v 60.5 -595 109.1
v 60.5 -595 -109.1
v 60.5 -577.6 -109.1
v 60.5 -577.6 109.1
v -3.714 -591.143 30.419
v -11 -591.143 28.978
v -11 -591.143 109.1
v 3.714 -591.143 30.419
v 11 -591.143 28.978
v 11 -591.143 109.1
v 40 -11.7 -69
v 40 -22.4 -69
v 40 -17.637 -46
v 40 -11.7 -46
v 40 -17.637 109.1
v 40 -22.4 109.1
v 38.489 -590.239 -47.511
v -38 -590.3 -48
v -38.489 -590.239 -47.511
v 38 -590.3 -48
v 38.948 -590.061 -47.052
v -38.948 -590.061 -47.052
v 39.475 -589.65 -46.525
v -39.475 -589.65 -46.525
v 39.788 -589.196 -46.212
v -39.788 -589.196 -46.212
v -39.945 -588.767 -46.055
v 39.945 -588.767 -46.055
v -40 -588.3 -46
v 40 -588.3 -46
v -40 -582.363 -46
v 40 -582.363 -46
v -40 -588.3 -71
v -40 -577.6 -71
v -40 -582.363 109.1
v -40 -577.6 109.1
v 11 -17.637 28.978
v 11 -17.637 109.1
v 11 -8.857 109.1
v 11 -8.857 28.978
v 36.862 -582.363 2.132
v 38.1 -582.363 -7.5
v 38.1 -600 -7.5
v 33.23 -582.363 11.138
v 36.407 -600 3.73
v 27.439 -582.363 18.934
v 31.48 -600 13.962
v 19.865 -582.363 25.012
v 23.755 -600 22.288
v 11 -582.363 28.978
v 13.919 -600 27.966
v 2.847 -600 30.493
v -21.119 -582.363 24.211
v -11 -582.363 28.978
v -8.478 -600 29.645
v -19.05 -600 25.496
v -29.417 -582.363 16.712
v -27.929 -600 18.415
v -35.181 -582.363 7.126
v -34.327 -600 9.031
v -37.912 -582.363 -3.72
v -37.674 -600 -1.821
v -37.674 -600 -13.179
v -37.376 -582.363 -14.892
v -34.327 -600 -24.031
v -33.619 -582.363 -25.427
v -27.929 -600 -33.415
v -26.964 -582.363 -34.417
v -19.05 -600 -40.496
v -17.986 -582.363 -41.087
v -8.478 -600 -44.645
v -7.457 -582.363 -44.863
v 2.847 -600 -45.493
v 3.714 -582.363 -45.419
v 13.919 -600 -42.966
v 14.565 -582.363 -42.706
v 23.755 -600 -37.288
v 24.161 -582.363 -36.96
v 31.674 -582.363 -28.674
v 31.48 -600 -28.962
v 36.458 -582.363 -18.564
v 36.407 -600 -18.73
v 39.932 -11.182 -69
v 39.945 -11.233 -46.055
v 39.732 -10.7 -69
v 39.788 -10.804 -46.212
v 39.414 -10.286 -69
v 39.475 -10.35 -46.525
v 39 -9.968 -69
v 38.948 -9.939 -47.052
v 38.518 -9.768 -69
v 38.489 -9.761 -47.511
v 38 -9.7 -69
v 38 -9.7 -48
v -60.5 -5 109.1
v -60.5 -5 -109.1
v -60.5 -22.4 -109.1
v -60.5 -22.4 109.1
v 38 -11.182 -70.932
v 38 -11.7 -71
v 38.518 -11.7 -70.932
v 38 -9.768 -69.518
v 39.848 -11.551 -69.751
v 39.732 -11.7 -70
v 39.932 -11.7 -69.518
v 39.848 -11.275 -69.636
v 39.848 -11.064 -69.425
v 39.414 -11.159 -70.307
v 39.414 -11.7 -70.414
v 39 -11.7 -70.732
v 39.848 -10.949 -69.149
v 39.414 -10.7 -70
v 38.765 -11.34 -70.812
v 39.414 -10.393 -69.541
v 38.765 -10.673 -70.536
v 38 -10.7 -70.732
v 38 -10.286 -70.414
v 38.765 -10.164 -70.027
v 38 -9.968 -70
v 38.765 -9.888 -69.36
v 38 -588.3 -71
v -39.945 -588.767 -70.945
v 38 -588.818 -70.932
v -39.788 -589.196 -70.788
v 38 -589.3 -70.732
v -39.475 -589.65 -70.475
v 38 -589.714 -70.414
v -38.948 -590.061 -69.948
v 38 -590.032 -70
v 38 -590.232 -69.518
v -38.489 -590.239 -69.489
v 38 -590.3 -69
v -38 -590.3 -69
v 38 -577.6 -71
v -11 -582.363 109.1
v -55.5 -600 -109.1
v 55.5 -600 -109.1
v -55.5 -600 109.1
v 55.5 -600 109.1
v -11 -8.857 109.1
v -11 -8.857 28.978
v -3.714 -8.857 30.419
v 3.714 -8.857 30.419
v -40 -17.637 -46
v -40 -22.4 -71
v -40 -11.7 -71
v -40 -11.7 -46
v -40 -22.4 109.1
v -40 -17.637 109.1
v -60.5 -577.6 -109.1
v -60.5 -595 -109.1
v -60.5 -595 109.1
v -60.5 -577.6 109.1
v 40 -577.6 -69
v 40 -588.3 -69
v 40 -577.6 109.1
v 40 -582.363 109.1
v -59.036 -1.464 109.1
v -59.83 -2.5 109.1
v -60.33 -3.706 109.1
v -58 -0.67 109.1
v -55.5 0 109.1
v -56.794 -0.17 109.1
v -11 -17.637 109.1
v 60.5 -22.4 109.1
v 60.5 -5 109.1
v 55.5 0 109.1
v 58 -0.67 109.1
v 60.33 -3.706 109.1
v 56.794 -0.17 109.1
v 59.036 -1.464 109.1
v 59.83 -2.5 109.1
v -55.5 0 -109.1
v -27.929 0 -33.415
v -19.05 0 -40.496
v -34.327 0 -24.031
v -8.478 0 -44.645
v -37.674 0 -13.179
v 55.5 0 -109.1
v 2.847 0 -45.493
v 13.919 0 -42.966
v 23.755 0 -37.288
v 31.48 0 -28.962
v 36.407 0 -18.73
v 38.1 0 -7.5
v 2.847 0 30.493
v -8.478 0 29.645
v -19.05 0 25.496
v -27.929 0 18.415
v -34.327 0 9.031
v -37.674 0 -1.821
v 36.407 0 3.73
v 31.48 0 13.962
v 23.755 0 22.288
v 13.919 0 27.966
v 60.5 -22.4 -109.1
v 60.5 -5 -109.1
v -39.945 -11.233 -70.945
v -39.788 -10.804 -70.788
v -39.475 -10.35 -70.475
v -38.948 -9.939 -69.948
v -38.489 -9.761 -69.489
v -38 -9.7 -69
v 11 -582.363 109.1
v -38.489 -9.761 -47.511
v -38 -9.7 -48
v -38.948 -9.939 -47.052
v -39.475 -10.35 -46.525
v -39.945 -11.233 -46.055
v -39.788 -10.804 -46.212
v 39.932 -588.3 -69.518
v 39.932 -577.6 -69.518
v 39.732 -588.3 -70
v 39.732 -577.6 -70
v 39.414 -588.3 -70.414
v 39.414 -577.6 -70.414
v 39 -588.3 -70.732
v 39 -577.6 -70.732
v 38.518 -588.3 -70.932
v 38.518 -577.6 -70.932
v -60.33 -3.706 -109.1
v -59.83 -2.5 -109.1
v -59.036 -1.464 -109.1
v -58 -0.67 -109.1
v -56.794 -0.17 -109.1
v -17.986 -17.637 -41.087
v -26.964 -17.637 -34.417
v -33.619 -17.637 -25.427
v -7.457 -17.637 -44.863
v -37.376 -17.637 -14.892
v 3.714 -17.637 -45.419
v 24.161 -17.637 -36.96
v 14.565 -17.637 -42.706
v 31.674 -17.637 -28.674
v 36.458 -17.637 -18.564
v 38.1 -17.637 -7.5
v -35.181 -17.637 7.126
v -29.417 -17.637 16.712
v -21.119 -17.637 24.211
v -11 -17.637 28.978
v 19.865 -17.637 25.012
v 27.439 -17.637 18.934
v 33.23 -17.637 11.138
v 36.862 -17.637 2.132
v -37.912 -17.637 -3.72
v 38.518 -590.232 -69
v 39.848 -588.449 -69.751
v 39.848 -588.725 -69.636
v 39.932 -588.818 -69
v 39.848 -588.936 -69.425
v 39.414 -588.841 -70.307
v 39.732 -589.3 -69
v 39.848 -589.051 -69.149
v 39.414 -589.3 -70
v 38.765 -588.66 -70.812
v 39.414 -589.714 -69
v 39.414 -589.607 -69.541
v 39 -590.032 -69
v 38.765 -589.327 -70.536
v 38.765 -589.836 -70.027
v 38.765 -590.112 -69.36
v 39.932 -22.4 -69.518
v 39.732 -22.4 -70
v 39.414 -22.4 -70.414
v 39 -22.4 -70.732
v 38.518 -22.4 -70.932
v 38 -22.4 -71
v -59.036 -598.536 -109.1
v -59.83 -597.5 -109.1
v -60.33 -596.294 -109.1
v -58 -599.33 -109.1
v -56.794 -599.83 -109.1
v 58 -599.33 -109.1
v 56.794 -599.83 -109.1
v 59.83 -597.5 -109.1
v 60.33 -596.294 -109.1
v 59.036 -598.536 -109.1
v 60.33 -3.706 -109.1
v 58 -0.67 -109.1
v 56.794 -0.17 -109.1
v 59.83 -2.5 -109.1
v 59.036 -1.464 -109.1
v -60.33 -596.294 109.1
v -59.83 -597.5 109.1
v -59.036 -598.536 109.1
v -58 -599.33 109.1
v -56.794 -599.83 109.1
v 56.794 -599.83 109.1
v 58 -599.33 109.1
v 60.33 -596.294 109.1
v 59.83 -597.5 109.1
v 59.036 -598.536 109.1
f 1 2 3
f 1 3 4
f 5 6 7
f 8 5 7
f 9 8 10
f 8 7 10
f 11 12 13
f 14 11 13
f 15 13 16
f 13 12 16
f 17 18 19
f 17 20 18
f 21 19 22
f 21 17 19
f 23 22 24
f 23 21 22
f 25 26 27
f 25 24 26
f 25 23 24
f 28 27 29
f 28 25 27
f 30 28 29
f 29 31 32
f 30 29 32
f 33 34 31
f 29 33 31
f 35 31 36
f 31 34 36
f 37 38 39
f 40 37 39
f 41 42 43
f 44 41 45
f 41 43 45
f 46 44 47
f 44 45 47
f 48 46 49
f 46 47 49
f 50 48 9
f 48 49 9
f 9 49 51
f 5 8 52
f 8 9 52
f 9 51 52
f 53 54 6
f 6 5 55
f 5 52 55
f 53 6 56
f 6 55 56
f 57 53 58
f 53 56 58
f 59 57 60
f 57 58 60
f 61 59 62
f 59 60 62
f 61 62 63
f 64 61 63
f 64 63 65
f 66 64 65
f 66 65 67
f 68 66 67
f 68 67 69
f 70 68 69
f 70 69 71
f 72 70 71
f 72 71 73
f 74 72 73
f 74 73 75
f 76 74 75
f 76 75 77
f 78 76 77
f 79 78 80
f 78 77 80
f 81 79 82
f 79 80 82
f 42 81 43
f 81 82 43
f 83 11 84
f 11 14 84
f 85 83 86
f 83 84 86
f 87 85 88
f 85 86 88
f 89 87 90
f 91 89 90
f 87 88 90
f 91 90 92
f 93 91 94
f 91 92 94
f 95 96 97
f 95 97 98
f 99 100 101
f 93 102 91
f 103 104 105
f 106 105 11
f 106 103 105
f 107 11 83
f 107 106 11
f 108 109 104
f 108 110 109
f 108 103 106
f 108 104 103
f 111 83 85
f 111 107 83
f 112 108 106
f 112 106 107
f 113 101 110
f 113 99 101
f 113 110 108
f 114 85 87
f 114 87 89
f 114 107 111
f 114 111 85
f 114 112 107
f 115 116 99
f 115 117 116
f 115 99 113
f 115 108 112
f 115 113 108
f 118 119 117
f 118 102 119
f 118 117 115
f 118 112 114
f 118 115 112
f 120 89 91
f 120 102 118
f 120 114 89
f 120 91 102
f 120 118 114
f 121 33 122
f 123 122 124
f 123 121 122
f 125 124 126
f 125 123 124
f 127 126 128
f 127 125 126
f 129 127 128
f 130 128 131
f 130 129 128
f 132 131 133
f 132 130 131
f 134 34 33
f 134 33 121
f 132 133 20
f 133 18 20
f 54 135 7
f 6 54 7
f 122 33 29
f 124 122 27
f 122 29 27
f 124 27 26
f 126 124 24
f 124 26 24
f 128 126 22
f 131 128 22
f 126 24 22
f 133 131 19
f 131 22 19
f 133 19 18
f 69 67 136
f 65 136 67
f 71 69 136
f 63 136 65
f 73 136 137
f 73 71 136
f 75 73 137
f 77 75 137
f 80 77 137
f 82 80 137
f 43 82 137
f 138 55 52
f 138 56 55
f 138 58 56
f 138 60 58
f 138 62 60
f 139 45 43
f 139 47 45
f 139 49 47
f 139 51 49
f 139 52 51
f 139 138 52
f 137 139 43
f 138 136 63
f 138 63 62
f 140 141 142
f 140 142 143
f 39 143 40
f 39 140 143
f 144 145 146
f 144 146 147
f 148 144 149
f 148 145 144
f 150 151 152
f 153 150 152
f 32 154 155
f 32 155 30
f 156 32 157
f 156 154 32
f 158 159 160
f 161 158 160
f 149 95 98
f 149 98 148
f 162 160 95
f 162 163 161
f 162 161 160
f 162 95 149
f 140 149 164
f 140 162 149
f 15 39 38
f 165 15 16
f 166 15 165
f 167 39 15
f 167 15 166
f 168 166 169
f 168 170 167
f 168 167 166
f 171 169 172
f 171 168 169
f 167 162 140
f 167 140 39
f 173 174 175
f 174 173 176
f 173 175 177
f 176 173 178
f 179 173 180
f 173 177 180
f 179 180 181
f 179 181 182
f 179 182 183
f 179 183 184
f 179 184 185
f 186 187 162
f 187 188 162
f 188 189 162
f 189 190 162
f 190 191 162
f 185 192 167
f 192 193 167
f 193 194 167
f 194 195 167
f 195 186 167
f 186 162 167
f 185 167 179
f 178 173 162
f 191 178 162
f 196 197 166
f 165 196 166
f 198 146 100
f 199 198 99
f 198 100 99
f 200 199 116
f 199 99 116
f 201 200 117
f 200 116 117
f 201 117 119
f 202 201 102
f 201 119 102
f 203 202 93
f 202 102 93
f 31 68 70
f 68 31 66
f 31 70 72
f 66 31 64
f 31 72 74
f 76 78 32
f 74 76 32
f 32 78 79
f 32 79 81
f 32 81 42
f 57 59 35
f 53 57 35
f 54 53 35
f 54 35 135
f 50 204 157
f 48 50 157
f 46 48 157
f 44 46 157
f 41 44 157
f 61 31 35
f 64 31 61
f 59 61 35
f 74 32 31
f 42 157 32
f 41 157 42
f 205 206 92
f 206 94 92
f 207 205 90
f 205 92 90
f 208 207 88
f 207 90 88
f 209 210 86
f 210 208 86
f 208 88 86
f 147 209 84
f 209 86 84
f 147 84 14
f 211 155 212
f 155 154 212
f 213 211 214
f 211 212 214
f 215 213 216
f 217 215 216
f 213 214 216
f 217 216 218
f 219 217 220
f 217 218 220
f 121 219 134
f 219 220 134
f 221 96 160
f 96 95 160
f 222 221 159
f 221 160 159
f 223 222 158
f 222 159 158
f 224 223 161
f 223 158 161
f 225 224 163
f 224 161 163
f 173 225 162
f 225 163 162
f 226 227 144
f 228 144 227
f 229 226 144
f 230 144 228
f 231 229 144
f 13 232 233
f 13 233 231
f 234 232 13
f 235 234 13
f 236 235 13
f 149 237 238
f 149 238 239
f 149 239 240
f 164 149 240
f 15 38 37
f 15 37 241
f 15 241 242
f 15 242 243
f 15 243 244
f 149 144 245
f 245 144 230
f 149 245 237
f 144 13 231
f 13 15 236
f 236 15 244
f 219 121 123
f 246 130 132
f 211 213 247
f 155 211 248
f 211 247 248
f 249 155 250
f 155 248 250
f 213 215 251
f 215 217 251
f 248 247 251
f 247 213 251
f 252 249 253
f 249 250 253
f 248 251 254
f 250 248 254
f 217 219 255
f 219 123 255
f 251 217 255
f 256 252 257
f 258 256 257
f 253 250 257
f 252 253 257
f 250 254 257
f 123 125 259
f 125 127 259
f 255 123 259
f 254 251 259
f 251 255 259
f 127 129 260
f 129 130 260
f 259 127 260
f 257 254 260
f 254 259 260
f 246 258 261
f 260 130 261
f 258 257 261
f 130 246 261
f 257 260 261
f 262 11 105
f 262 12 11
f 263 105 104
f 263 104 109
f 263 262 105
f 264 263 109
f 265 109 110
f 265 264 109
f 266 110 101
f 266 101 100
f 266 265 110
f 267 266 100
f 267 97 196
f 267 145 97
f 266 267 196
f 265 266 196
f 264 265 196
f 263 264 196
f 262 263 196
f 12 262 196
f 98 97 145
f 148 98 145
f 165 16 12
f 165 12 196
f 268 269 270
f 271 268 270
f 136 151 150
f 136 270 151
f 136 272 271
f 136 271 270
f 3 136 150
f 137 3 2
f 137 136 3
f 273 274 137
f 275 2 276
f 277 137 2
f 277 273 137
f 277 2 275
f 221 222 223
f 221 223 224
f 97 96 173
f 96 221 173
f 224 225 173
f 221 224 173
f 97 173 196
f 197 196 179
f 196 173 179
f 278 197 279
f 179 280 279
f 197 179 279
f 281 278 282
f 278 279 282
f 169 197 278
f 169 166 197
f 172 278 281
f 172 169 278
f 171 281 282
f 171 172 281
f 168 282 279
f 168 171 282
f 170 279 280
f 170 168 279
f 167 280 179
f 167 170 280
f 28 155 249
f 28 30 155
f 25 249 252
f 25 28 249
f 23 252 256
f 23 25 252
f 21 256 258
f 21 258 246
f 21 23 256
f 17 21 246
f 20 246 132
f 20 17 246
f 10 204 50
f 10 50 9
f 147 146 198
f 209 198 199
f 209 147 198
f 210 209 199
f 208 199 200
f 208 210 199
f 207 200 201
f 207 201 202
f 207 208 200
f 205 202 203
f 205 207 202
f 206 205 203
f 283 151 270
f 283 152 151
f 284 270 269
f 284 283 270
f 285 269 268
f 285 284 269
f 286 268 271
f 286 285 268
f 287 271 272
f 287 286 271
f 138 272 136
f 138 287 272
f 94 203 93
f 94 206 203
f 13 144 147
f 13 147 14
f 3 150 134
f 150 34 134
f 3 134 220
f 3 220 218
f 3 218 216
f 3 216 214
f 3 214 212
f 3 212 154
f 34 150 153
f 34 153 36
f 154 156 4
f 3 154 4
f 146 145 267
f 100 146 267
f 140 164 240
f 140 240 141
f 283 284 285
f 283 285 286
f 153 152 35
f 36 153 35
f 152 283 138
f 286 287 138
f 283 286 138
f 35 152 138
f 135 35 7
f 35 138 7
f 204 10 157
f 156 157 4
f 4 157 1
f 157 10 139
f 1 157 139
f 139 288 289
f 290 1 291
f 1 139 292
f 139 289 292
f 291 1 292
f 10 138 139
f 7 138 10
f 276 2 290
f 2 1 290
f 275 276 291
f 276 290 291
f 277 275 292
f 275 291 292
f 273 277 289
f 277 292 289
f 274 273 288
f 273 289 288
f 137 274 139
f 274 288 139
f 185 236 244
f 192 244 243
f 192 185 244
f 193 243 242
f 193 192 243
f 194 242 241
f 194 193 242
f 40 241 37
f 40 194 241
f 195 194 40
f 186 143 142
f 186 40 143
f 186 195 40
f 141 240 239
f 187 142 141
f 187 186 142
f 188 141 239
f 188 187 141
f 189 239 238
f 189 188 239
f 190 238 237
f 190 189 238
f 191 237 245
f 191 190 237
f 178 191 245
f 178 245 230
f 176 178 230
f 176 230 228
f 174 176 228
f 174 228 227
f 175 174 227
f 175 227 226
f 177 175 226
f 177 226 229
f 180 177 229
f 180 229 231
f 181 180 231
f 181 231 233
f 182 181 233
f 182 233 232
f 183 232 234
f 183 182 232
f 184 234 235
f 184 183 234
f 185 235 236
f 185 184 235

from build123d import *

# Parameters (mm, degrees)
F0_W      = 121
F0_H      = 218.2
F0_R      = 38.1
F1_DEPTH  = 22.4
F2_W      = 80
F2_H      = 180.1
F3_DEPTH  = 4.763
F4_W      = 80
F4_H      = 25
F5_DEPTH  = 12.7
F6_R      = 5
F7_R      = 2
F10_W     = 22
F10_H     = 8.78
F11_DEPTH = 100


with BuildPart() as f1:
    # F0 (on Front) → F1 (new body)
    with BuildSketch(Plane.XZ):
        Rectangle(F0_W, F0_H)
        with Locations((0, -7.5)):
            Circle(F0_R, mode=Mode.SUBTRACT)
    extrude(amount=F1_DEPTH)

    # F2 (on face) → F3 (cut)
    with BuildSketch(Plane.XZ.offset(22.4)):
        with Locations((0, 19.05)):
            Rectangle(F2_W, F2_H)
    extrude(amount=-F3_DEPTH, mode=Mode.SUBTRACT)

    # F4 (on face) → F5 (cut)
    with BuildSketch(Plane.XZ.offset(22.4)):
        with Locations((0, -58.5)):
            Rectangle(F4_W, F4_H)
    extrude(amount=-F5_DEPTH, mode=Mode.SUBTRACT)

    # F6
    f6_edges = [f1.edges().sort_by_distance(p)[0] for p in [
        (-60.5, 0, 0),
        (60.5, 0, 0),
    ]]
    fillet(f6_edges, radius=F6_R)

    # F7
    f7_edges = [f1.edges().sort_by_distance(p)[0] for p in [
        (0, -9.7, -71),
        (40, -16.05, -71),
        (40, -9.7, -58.5),
        (-40, -9.7, -58.5),
        (0, -9.7, -46),
    ]]
    fillet(f7_edges, radius=F7_R)

    # F10 (on face) → F11 (cut)
    with BuildSketch(Plane.XY.offset(109.1)):
        with Locations((0, -13.247)):
            Rectangle(F10_W, F10_H)
    extrude(amount=-F11_DEPTH, mode=Mode.SUBTRACT)


with BuildPart() as f9_1:
    # F9: instance of F1
    add(f1.part.mirror(Plane.XZ.offset(300)))


with BuildPart() as f13_1:
    # F13: instance of F1
    add(f1.part.mirror(Plane.XZ.offset(300)))


solid = Compound([f1.part, f13_1.part])
